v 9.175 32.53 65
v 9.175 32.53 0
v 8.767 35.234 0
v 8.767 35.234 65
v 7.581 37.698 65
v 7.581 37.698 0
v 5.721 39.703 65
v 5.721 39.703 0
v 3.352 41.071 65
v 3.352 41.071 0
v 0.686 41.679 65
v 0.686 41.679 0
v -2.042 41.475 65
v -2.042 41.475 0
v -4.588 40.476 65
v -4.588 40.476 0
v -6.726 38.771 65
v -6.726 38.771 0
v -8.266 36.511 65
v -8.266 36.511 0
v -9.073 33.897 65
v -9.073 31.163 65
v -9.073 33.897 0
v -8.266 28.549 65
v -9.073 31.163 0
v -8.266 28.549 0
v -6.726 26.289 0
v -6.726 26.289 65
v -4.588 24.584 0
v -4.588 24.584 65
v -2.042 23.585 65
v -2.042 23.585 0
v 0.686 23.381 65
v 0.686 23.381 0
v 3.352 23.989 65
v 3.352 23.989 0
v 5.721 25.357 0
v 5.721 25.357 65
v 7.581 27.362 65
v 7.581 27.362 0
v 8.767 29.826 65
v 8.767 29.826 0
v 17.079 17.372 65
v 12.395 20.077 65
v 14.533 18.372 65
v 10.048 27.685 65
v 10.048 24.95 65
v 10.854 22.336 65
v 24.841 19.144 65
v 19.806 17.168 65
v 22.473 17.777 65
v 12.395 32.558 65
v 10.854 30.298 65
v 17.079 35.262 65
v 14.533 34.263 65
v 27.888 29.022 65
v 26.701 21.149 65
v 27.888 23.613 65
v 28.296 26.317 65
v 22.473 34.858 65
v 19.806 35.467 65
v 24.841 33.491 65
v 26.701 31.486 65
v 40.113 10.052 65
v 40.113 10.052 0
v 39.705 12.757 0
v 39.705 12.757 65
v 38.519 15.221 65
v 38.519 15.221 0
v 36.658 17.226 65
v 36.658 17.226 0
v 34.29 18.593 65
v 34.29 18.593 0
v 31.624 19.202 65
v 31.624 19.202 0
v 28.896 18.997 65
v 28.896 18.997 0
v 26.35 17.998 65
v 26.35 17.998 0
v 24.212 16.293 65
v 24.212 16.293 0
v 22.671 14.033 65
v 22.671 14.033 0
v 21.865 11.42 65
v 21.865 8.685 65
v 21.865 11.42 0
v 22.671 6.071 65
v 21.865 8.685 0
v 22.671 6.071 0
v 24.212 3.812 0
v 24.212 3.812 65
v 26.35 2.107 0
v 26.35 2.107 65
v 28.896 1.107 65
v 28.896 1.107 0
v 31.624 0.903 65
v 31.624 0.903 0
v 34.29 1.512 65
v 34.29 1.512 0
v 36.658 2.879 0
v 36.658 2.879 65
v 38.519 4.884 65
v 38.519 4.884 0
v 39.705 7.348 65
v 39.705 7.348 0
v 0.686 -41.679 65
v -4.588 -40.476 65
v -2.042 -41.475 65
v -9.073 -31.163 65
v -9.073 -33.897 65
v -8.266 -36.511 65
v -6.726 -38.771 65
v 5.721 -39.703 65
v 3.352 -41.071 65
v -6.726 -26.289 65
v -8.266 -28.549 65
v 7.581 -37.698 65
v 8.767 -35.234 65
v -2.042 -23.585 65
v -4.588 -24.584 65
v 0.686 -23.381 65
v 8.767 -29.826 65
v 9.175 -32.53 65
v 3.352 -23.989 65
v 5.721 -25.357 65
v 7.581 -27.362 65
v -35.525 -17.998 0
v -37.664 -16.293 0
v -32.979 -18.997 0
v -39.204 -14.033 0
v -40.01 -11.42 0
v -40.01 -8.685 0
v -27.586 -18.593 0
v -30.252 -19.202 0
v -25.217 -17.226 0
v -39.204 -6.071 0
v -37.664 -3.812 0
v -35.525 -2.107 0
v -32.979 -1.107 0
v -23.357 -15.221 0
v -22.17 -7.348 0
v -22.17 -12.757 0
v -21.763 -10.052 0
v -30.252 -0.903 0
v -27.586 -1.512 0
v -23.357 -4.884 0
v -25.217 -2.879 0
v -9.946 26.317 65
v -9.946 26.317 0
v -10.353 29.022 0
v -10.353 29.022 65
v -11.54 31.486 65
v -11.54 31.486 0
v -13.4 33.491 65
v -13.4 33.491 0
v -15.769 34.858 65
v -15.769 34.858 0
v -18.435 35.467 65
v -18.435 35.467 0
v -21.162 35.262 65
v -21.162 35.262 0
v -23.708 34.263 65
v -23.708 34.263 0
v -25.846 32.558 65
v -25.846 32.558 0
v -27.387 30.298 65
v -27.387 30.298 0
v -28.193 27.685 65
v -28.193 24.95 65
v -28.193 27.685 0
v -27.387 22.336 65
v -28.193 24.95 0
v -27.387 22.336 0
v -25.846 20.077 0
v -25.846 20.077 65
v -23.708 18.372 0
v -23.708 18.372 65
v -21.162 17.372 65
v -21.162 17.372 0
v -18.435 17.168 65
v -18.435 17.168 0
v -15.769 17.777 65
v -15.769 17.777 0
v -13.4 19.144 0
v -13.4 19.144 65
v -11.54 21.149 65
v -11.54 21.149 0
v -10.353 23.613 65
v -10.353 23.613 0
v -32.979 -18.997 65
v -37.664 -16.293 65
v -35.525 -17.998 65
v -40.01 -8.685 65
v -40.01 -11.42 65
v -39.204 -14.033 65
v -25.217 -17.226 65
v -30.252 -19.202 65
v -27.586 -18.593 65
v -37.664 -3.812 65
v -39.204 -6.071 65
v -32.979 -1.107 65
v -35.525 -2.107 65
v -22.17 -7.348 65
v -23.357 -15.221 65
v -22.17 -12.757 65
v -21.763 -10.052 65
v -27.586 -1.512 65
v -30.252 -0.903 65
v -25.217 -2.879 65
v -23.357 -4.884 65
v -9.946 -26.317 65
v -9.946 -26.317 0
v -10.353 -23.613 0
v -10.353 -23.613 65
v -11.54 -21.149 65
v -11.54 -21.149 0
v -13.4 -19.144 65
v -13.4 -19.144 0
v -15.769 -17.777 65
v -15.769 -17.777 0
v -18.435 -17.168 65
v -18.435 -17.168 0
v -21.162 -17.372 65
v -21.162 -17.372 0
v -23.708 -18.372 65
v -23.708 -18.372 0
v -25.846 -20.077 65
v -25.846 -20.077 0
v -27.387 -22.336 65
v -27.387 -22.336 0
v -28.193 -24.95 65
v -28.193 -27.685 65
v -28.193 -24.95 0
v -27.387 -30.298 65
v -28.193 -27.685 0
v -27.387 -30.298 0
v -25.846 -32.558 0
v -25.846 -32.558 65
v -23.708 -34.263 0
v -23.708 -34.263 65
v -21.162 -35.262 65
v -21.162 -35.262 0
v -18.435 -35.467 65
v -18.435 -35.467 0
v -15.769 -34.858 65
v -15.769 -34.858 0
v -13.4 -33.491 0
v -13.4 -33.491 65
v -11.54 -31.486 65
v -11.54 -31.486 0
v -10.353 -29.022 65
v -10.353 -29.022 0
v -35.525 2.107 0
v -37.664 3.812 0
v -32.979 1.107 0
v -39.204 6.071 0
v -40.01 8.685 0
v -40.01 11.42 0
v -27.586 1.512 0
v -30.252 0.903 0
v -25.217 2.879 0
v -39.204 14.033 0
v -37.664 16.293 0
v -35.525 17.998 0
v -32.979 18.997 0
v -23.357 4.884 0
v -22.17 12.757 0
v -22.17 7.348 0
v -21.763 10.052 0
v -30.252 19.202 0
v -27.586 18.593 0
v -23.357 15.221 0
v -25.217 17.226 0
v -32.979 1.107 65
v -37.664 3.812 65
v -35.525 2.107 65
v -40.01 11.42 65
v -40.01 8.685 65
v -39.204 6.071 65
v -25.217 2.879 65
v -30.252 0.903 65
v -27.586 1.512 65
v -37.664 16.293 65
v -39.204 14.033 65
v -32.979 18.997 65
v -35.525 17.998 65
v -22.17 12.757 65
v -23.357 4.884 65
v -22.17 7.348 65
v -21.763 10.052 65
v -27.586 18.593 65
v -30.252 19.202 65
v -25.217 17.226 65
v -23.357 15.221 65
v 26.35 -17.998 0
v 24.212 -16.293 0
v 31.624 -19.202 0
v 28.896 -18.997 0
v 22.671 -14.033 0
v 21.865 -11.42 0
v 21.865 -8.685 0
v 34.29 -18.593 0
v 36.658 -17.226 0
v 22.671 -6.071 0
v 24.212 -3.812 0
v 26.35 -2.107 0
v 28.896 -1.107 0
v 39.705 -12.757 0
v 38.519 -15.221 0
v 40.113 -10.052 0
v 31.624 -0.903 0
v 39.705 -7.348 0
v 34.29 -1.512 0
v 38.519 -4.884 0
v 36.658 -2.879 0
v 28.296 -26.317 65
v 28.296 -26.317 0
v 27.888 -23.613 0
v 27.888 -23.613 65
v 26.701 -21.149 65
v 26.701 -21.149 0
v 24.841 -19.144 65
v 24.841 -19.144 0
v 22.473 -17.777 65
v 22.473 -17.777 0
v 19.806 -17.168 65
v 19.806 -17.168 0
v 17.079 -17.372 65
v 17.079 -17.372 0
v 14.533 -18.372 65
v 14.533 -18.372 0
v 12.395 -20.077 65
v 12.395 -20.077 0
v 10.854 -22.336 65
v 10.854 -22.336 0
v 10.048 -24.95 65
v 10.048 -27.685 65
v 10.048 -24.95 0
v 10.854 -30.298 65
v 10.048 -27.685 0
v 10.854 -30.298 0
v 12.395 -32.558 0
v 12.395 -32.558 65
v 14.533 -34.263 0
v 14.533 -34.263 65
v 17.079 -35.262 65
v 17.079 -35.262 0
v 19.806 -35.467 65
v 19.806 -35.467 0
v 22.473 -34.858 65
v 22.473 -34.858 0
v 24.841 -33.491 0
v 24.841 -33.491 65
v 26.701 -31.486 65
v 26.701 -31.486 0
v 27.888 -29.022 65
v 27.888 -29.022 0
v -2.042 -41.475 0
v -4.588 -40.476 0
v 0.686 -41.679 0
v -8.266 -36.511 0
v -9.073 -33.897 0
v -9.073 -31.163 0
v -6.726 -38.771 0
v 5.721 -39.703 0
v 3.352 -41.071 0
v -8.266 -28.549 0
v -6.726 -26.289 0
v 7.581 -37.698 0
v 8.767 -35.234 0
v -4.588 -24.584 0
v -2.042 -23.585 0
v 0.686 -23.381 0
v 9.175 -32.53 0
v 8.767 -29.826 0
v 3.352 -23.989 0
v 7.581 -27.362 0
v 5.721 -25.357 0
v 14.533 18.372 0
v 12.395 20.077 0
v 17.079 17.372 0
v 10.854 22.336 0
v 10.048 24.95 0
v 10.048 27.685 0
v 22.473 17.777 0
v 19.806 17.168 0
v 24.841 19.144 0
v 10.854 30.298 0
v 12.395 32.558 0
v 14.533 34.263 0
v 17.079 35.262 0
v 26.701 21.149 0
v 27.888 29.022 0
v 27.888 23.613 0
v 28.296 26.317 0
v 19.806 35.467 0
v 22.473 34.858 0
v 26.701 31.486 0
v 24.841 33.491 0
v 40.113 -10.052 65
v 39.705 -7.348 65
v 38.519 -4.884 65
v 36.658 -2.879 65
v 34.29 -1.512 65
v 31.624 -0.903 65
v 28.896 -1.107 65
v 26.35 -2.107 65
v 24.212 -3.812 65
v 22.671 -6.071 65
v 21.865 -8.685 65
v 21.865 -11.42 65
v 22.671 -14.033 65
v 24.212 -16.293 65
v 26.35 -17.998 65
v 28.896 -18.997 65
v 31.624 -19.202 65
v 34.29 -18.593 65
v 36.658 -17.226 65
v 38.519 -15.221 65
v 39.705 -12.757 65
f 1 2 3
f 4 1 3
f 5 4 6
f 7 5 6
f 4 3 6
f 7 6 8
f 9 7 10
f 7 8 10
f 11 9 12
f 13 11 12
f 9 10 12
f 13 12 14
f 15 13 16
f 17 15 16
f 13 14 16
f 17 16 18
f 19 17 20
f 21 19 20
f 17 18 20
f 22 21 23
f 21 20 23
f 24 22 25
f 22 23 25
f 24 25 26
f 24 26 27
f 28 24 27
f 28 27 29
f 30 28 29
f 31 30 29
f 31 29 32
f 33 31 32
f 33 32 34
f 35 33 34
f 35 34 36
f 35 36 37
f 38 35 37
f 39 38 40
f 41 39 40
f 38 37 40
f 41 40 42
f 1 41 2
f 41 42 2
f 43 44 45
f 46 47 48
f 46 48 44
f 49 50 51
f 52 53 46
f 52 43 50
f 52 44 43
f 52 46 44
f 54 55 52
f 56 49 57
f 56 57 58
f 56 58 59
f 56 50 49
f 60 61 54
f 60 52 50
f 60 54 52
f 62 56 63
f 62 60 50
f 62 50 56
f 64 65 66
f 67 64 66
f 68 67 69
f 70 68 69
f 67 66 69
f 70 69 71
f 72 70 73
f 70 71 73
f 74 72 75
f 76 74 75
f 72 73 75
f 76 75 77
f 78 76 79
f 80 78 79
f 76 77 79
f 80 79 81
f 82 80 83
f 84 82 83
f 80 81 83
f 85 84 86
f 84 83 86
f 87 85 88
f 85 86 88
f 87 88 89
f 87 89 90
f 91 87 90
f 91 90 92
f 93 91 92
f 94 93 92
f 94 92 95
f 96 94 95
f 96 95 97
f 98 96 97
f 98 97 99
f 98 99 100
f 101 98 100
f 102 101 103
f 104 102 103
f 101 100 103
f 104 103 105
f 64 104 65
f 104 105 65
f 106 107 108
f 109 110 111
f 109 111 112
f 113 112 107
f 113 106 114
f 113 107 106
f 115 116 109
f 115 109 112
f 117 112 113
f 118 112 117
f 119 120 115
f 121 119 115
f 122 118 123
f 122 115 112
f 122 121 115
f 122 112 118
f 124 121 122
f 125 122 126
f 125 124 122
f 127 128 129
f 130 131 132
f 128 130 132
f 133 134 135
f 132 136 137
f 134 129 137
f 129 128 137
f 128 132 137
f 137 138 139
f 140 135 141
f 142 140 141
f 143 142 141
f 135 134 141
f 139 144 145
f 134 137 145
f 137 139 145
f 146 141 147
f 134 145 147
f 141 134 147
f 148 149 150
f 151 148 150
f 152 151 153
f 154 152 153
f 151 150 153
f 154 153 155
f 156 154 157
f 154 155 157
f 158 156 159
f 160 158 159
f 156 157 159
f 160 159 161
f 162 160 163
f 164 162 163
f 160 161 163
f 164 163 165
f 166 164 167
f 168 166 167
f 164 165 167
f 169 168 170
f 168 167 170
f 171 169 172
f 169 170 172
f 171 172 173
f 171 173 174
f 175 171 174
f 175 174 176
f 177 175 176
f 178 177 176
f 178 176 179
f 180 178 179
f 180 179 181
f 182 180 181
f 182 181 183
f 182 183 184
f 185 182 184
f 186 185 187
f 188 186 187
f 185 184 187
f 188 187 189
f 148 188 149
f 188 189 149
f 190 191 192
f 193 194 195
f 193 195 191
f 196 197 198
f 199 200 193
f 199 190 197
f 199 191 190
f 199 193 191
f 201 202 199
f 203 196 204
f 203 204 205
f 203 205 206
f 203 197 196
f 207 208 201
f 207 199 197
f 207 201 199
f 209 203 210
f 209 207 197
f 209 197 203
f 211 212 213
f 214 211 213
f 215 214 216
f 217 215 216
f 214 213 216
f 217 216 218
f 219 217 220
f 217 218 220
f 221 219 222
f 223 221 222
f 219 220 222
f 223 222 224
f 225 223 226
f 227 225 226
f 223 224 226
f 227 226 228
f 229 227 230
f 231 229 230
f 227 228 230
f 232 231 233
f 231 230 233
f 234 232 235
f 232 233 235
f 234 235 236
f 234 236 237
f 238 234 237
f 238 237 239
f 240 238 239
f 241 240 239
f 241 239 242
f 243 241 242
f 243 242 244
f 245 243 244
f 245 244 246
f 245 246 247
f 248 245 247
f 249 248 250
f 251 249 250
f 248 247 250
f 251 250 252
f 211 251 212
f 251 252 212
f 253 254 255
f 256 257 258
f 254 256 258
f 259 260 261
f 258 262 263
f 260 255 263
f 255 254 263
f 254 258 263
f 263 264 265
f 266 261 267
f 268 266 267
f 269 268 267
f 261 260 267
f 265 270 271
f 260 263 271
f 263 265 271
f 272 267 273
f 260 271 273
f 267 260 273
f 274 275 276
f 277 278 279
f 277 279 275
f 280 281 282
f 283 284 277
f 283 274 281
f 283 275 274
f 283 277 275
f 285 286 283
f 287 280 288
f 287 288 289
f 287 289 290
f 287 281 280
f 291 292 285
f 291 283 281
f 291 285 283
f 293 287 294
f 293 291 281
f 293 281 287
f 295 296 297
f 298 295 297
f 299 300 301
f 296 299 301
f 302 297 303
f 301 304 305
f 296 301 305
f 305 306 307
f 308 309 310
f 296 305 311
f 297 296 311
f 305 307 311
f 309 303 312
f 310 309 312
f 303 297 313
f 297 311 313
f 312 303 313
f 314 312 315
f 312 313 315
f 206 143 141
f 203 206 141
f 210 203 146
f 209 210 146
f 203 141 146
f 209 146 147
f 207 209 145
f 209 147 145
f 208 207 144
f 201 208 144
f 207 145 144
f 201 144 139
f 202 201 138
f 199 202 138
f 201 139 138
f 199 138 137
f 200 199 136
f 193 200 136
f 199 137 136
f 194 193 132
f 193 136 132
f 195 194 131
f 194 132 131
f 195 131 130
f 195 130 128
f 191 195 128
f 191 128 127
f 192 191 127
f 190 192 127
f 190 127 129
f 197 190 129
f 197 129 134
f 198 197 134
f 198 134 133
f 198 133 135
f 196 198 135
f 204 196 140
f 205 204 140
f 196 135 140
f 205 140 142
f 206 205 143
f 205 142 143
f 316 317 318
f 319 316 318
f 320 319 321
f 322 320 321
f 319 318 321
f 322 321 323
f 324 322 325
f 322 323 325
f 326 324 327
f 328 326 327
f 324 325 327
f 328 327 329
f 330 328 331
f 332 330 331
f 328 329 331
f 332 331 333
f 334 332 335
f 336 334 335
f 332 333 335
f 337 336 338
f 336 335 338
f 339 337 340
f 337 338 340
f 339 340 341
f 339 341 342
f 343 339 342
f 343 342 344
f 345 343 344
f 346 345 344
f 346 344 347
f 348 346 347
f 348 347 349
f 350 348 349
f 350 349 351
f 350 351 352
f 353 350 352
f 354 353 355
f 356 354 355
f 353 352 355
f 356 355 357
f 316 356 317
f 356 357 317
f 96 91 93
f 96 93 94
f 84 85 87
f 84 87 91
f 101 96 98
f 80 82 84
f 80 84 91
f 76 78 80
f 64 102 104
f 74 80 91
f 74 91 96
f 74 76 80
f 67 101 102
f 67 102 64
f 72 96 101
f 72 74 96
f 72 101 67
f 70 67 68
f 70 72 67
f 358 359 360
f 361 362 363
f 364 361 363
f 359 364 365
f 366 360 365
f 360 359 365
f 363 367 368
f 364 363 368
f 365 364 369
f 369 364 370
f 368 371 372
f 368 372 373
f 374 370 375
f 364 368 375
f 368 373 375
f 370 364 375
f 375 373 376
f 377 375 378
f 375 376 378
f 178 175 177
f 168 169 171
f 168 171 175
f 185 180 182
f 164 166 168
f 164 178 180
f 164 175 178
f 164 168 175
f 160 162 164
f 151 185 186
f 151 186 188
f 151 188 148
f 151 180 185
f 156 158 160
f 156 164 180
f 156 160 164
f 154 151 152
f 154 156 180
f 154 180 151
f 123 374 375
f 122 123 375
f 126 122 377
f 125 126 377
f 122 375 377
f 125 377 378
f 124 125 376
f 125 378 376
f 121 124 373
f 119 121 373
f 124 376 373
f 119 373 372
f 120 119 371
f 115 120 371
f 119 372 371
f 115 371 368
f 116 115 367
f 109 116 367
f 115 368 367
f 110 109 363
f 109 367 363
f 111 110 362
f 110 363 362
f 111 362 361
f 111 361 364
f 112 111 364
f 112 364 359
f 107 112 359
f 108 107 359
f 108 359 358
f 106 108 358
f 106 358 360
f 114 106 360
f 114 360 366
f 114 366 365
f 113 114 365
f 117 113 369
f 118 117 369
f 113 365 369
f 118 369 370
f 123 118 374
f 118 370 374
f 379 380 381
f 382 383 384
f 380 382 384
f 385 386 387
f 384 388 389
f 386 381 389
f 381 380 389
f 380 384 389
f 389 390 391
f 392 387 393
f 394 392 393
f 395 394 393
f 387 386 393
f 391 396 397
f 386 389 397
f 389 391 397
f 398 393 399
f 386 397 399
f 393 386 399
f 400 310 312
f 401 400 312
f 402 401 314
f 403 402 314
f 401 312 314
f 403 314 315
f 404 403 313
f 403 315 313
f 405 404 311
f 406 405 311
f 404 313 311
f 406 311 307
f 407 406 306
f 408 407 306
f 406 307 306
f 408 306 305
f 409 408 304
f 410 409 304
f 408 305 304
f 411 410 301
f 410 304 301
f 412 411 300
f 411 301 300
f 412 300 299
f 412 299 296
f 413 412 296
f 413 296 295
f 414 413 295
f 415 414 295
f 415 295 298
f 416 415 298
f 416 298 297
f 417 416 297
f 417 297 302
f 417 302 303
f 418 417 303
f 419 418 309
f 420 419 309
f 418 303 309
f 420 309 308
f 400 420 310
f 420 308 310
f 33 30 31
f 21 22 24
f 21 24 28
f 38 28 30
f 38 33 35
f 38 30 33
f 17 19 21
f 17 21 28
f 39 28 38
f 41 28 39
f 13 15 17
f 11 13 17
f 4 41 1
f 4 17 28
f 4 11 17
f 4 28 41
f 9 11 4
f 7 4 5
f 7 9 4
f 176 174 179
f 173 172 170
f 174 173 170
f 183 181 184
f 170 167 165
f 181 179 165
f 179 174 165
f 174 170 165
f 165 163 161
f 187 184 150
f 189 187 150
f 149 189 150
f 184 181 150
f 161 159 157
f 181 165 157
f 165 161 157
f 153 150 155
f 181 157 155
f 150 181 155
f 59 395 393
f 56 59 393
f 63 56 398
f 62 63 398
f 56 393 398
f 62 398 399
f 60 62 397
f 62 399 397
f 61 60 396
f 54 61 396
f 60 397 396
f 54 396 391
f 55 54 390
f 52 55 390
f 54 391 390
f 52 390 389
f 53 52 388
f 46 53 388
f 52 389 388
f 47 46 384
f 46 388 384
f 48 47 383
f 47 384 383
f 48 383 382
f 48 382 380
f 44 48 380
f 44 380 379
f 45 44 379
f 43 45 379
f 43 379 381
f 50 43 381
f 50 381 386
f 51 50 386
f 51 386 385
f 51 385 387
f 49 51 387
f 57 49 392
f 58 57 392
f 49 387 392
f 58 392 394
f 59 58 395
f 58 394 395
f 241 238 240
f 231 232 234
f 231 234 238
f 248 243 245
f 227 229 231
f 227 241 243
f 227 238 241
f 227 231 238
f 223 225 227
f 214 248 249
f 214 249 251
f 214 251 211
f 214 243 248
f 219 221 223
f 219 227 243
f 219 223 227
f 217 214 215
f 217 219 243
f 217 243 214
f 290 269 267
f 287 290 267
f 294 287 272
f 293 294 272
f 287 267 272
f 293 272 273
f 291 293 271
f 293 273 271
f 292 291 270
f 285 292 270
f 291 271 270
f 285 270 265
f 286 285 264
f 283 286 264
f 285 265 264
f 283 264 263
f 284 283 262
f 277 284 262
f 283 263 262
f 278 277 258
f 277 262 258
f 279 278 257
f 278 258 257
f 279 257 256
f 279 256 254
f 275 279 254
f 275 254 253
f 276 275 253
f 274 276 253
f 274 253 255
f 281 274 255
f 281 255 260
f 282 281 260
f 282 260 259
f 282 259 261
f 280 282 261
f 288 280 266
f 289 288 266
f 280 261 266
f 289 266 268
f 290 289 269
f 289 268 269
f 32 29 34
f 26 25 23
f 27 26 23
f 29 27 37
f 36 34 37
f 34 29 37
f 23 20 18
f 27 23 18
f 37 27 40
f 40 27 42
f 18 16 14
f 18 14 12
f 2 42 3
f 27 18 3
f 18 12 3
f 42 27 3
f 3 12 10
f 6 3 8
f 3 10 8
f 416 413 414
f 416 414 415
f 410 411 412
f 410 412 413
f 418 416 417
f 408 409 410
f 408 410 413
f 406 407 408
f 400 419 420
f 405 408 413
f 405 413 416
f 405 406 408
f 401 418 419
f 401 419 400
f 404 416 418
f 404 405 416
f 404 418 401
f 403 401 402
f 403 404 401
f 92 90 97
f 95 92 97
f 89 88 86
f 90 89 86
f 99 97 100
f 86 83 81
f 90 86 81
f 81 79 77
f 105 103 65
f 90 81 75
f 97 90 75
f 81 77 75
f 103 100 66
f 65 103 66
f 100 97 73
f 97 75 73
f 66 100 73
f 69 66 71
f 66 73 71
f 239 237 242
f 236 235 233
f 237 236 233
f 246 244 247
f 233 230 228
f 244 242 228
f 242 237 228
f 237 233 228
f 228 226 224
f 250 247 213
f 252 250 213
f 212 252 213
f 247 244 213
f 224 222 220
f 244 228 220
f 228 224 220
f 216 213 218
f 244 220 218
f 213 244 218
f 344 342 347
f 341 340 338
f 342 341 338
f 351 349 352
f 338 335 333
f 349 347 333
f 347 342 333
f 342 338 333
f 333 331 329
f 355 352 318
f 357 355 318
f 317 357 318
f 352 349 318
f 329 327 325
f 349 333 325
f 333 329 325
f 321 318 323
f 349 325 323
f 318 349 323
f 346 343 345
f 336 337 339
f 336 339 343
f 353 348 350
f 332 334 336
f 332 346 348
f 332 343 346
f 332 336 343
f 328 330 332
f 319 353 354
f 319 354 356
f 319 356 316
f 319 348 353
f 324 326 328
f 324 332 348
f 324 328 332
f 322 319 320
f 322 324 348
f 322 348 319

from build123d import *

# Parameters (mm, degrees)
SKETCH2_R              = 9.175
BOSS_EXTRUDE1_DEPTH    = 65
BOSS_EXTRUDE1_2_DEPTH  = 65
BOSS_EXTRUDE1_3_DEPTH  = 65
BOSS_EXTRUDE1_4_DEPTH  = 65
BOSS_EXTRUDE1_5_DEPTH  = 65
BOSS_EXTRUDE1_6_DEPTH  = 65
BOSS_EXTRUDE1_7_DEPTH  = 65
BOSS_EXTRUDE1_8_DEPTH  = 65
BOSS_EXTRUDE1_9_DEPTH  = 65
BOSS_EXTRUDE1_10_DEPTH = 65


with BuildPart() as part:
    # Sketch2 → Boss-Extrude1 (new body)
    with BuildSketch(Plane.XY):
        with Locations((0, -32.53)):
            Circle(SKETCH2_R)
    extrude(amount=BOSS_EXTRUDE1_DEPTH)


with BuildPart() as body_2:
    # Sketch2 → Boss-Extrude1 2 (new body)
    with BuildSketch(Plane.XY):
        with Locations((-19.120654257, -26.317322827)):
            Circle(SKETCH2_R)
    extrude(amount=BOSS_EXTRUDE1_2_DEPTH)


with BuildPart() as body_3:
    # Sketch2 → Boss-Extrude1 3 (new body)
    with BuildSketch(Plane.XY):
        with Locations((-30.937868475, -10.052322827)):
            Circle(SKETCH2_R)
    extrude(amount=BOSS_EXTRUDE1_3_DEPTH)


with BuildPart() as body_4:
    # Sketch2 → Boss-Extrude1 4 (new body)
    with BuildSketch(Plane.XY):
        with Locations((-30.937868475, 10.052322827)):
            Circle(SKETCH2_R)
    extrude(amount=BOSS_EXTRUDE1_4_DEPTH)


with BuildPart() as body_5:
    # Sketch2 → Boss-Extrude1 5 (new body)
    with BuildSketch(Plane.XY):
        with Locations((-19.120654257, 26.317322827)):
            Circle(SKETCH2_R)
    extrude(amount=BOSS_EXTRUDE1_5_DEPTH)


with BuildPart() as body_6:
    # Sketch2 → Boss-Extrude1 6 (new body)
    with BuildSketch(Plane.XY):
        with Locations((0, 32.53)):
            Circle(SKETCH2_R)
    extrude(amount=BOSS_EXTRUDE1_6_DEPTH)


with BuildPart() as body_7:
    # Sketch2 → Boss-Extrude1 7 (new body)
    with BuildSketch(Plane.XY):
        with Locations((19.120654257, 26.317322827)):
            Circle(SKETCH2_R)
    extrude(amount=BOSS_EXTRUDE1_7_DEPTH)


with BuildPart() as body_8:
    # Sketch2 → Boss-Extrude1 8 (new body)
    with BuildSketch(Plane.XY):
        with Locations((30.937868475, 10.052322827)):
            Circle(SKETCH2_R)
    extrude(amount=BOSS_EXTRUDE1_8_DEPTH)


with BuildPart() as body_9:
    # Sketch2 → Boss-Extrude1 9 (new body)
    with BuildSketch(Plane.XY):
        with Locations((30.937868475, -10.052322827)):
            Circle(SKETCH2_R)
    extrude(amount=BOSS_EXTRUDE1_9_DEPTH)


with BuildPart() as body_10:
    # Sketch2 → Boss-Extrude1 10 (new body)
    with BuildSketch(Plane.XY):
        with Locations((19.120654257, -26.317322827)):
            Circle(SKETCH2_R)
    extrude(amount=BOSS_EXTRUDE1_10_DEPTH)


solid = Compound([part.part, body_2.part, body_3.part, body_4.part, body_5.part, body_6.part, body_7.part, body_8.part, body_9.part, body_10.part])
